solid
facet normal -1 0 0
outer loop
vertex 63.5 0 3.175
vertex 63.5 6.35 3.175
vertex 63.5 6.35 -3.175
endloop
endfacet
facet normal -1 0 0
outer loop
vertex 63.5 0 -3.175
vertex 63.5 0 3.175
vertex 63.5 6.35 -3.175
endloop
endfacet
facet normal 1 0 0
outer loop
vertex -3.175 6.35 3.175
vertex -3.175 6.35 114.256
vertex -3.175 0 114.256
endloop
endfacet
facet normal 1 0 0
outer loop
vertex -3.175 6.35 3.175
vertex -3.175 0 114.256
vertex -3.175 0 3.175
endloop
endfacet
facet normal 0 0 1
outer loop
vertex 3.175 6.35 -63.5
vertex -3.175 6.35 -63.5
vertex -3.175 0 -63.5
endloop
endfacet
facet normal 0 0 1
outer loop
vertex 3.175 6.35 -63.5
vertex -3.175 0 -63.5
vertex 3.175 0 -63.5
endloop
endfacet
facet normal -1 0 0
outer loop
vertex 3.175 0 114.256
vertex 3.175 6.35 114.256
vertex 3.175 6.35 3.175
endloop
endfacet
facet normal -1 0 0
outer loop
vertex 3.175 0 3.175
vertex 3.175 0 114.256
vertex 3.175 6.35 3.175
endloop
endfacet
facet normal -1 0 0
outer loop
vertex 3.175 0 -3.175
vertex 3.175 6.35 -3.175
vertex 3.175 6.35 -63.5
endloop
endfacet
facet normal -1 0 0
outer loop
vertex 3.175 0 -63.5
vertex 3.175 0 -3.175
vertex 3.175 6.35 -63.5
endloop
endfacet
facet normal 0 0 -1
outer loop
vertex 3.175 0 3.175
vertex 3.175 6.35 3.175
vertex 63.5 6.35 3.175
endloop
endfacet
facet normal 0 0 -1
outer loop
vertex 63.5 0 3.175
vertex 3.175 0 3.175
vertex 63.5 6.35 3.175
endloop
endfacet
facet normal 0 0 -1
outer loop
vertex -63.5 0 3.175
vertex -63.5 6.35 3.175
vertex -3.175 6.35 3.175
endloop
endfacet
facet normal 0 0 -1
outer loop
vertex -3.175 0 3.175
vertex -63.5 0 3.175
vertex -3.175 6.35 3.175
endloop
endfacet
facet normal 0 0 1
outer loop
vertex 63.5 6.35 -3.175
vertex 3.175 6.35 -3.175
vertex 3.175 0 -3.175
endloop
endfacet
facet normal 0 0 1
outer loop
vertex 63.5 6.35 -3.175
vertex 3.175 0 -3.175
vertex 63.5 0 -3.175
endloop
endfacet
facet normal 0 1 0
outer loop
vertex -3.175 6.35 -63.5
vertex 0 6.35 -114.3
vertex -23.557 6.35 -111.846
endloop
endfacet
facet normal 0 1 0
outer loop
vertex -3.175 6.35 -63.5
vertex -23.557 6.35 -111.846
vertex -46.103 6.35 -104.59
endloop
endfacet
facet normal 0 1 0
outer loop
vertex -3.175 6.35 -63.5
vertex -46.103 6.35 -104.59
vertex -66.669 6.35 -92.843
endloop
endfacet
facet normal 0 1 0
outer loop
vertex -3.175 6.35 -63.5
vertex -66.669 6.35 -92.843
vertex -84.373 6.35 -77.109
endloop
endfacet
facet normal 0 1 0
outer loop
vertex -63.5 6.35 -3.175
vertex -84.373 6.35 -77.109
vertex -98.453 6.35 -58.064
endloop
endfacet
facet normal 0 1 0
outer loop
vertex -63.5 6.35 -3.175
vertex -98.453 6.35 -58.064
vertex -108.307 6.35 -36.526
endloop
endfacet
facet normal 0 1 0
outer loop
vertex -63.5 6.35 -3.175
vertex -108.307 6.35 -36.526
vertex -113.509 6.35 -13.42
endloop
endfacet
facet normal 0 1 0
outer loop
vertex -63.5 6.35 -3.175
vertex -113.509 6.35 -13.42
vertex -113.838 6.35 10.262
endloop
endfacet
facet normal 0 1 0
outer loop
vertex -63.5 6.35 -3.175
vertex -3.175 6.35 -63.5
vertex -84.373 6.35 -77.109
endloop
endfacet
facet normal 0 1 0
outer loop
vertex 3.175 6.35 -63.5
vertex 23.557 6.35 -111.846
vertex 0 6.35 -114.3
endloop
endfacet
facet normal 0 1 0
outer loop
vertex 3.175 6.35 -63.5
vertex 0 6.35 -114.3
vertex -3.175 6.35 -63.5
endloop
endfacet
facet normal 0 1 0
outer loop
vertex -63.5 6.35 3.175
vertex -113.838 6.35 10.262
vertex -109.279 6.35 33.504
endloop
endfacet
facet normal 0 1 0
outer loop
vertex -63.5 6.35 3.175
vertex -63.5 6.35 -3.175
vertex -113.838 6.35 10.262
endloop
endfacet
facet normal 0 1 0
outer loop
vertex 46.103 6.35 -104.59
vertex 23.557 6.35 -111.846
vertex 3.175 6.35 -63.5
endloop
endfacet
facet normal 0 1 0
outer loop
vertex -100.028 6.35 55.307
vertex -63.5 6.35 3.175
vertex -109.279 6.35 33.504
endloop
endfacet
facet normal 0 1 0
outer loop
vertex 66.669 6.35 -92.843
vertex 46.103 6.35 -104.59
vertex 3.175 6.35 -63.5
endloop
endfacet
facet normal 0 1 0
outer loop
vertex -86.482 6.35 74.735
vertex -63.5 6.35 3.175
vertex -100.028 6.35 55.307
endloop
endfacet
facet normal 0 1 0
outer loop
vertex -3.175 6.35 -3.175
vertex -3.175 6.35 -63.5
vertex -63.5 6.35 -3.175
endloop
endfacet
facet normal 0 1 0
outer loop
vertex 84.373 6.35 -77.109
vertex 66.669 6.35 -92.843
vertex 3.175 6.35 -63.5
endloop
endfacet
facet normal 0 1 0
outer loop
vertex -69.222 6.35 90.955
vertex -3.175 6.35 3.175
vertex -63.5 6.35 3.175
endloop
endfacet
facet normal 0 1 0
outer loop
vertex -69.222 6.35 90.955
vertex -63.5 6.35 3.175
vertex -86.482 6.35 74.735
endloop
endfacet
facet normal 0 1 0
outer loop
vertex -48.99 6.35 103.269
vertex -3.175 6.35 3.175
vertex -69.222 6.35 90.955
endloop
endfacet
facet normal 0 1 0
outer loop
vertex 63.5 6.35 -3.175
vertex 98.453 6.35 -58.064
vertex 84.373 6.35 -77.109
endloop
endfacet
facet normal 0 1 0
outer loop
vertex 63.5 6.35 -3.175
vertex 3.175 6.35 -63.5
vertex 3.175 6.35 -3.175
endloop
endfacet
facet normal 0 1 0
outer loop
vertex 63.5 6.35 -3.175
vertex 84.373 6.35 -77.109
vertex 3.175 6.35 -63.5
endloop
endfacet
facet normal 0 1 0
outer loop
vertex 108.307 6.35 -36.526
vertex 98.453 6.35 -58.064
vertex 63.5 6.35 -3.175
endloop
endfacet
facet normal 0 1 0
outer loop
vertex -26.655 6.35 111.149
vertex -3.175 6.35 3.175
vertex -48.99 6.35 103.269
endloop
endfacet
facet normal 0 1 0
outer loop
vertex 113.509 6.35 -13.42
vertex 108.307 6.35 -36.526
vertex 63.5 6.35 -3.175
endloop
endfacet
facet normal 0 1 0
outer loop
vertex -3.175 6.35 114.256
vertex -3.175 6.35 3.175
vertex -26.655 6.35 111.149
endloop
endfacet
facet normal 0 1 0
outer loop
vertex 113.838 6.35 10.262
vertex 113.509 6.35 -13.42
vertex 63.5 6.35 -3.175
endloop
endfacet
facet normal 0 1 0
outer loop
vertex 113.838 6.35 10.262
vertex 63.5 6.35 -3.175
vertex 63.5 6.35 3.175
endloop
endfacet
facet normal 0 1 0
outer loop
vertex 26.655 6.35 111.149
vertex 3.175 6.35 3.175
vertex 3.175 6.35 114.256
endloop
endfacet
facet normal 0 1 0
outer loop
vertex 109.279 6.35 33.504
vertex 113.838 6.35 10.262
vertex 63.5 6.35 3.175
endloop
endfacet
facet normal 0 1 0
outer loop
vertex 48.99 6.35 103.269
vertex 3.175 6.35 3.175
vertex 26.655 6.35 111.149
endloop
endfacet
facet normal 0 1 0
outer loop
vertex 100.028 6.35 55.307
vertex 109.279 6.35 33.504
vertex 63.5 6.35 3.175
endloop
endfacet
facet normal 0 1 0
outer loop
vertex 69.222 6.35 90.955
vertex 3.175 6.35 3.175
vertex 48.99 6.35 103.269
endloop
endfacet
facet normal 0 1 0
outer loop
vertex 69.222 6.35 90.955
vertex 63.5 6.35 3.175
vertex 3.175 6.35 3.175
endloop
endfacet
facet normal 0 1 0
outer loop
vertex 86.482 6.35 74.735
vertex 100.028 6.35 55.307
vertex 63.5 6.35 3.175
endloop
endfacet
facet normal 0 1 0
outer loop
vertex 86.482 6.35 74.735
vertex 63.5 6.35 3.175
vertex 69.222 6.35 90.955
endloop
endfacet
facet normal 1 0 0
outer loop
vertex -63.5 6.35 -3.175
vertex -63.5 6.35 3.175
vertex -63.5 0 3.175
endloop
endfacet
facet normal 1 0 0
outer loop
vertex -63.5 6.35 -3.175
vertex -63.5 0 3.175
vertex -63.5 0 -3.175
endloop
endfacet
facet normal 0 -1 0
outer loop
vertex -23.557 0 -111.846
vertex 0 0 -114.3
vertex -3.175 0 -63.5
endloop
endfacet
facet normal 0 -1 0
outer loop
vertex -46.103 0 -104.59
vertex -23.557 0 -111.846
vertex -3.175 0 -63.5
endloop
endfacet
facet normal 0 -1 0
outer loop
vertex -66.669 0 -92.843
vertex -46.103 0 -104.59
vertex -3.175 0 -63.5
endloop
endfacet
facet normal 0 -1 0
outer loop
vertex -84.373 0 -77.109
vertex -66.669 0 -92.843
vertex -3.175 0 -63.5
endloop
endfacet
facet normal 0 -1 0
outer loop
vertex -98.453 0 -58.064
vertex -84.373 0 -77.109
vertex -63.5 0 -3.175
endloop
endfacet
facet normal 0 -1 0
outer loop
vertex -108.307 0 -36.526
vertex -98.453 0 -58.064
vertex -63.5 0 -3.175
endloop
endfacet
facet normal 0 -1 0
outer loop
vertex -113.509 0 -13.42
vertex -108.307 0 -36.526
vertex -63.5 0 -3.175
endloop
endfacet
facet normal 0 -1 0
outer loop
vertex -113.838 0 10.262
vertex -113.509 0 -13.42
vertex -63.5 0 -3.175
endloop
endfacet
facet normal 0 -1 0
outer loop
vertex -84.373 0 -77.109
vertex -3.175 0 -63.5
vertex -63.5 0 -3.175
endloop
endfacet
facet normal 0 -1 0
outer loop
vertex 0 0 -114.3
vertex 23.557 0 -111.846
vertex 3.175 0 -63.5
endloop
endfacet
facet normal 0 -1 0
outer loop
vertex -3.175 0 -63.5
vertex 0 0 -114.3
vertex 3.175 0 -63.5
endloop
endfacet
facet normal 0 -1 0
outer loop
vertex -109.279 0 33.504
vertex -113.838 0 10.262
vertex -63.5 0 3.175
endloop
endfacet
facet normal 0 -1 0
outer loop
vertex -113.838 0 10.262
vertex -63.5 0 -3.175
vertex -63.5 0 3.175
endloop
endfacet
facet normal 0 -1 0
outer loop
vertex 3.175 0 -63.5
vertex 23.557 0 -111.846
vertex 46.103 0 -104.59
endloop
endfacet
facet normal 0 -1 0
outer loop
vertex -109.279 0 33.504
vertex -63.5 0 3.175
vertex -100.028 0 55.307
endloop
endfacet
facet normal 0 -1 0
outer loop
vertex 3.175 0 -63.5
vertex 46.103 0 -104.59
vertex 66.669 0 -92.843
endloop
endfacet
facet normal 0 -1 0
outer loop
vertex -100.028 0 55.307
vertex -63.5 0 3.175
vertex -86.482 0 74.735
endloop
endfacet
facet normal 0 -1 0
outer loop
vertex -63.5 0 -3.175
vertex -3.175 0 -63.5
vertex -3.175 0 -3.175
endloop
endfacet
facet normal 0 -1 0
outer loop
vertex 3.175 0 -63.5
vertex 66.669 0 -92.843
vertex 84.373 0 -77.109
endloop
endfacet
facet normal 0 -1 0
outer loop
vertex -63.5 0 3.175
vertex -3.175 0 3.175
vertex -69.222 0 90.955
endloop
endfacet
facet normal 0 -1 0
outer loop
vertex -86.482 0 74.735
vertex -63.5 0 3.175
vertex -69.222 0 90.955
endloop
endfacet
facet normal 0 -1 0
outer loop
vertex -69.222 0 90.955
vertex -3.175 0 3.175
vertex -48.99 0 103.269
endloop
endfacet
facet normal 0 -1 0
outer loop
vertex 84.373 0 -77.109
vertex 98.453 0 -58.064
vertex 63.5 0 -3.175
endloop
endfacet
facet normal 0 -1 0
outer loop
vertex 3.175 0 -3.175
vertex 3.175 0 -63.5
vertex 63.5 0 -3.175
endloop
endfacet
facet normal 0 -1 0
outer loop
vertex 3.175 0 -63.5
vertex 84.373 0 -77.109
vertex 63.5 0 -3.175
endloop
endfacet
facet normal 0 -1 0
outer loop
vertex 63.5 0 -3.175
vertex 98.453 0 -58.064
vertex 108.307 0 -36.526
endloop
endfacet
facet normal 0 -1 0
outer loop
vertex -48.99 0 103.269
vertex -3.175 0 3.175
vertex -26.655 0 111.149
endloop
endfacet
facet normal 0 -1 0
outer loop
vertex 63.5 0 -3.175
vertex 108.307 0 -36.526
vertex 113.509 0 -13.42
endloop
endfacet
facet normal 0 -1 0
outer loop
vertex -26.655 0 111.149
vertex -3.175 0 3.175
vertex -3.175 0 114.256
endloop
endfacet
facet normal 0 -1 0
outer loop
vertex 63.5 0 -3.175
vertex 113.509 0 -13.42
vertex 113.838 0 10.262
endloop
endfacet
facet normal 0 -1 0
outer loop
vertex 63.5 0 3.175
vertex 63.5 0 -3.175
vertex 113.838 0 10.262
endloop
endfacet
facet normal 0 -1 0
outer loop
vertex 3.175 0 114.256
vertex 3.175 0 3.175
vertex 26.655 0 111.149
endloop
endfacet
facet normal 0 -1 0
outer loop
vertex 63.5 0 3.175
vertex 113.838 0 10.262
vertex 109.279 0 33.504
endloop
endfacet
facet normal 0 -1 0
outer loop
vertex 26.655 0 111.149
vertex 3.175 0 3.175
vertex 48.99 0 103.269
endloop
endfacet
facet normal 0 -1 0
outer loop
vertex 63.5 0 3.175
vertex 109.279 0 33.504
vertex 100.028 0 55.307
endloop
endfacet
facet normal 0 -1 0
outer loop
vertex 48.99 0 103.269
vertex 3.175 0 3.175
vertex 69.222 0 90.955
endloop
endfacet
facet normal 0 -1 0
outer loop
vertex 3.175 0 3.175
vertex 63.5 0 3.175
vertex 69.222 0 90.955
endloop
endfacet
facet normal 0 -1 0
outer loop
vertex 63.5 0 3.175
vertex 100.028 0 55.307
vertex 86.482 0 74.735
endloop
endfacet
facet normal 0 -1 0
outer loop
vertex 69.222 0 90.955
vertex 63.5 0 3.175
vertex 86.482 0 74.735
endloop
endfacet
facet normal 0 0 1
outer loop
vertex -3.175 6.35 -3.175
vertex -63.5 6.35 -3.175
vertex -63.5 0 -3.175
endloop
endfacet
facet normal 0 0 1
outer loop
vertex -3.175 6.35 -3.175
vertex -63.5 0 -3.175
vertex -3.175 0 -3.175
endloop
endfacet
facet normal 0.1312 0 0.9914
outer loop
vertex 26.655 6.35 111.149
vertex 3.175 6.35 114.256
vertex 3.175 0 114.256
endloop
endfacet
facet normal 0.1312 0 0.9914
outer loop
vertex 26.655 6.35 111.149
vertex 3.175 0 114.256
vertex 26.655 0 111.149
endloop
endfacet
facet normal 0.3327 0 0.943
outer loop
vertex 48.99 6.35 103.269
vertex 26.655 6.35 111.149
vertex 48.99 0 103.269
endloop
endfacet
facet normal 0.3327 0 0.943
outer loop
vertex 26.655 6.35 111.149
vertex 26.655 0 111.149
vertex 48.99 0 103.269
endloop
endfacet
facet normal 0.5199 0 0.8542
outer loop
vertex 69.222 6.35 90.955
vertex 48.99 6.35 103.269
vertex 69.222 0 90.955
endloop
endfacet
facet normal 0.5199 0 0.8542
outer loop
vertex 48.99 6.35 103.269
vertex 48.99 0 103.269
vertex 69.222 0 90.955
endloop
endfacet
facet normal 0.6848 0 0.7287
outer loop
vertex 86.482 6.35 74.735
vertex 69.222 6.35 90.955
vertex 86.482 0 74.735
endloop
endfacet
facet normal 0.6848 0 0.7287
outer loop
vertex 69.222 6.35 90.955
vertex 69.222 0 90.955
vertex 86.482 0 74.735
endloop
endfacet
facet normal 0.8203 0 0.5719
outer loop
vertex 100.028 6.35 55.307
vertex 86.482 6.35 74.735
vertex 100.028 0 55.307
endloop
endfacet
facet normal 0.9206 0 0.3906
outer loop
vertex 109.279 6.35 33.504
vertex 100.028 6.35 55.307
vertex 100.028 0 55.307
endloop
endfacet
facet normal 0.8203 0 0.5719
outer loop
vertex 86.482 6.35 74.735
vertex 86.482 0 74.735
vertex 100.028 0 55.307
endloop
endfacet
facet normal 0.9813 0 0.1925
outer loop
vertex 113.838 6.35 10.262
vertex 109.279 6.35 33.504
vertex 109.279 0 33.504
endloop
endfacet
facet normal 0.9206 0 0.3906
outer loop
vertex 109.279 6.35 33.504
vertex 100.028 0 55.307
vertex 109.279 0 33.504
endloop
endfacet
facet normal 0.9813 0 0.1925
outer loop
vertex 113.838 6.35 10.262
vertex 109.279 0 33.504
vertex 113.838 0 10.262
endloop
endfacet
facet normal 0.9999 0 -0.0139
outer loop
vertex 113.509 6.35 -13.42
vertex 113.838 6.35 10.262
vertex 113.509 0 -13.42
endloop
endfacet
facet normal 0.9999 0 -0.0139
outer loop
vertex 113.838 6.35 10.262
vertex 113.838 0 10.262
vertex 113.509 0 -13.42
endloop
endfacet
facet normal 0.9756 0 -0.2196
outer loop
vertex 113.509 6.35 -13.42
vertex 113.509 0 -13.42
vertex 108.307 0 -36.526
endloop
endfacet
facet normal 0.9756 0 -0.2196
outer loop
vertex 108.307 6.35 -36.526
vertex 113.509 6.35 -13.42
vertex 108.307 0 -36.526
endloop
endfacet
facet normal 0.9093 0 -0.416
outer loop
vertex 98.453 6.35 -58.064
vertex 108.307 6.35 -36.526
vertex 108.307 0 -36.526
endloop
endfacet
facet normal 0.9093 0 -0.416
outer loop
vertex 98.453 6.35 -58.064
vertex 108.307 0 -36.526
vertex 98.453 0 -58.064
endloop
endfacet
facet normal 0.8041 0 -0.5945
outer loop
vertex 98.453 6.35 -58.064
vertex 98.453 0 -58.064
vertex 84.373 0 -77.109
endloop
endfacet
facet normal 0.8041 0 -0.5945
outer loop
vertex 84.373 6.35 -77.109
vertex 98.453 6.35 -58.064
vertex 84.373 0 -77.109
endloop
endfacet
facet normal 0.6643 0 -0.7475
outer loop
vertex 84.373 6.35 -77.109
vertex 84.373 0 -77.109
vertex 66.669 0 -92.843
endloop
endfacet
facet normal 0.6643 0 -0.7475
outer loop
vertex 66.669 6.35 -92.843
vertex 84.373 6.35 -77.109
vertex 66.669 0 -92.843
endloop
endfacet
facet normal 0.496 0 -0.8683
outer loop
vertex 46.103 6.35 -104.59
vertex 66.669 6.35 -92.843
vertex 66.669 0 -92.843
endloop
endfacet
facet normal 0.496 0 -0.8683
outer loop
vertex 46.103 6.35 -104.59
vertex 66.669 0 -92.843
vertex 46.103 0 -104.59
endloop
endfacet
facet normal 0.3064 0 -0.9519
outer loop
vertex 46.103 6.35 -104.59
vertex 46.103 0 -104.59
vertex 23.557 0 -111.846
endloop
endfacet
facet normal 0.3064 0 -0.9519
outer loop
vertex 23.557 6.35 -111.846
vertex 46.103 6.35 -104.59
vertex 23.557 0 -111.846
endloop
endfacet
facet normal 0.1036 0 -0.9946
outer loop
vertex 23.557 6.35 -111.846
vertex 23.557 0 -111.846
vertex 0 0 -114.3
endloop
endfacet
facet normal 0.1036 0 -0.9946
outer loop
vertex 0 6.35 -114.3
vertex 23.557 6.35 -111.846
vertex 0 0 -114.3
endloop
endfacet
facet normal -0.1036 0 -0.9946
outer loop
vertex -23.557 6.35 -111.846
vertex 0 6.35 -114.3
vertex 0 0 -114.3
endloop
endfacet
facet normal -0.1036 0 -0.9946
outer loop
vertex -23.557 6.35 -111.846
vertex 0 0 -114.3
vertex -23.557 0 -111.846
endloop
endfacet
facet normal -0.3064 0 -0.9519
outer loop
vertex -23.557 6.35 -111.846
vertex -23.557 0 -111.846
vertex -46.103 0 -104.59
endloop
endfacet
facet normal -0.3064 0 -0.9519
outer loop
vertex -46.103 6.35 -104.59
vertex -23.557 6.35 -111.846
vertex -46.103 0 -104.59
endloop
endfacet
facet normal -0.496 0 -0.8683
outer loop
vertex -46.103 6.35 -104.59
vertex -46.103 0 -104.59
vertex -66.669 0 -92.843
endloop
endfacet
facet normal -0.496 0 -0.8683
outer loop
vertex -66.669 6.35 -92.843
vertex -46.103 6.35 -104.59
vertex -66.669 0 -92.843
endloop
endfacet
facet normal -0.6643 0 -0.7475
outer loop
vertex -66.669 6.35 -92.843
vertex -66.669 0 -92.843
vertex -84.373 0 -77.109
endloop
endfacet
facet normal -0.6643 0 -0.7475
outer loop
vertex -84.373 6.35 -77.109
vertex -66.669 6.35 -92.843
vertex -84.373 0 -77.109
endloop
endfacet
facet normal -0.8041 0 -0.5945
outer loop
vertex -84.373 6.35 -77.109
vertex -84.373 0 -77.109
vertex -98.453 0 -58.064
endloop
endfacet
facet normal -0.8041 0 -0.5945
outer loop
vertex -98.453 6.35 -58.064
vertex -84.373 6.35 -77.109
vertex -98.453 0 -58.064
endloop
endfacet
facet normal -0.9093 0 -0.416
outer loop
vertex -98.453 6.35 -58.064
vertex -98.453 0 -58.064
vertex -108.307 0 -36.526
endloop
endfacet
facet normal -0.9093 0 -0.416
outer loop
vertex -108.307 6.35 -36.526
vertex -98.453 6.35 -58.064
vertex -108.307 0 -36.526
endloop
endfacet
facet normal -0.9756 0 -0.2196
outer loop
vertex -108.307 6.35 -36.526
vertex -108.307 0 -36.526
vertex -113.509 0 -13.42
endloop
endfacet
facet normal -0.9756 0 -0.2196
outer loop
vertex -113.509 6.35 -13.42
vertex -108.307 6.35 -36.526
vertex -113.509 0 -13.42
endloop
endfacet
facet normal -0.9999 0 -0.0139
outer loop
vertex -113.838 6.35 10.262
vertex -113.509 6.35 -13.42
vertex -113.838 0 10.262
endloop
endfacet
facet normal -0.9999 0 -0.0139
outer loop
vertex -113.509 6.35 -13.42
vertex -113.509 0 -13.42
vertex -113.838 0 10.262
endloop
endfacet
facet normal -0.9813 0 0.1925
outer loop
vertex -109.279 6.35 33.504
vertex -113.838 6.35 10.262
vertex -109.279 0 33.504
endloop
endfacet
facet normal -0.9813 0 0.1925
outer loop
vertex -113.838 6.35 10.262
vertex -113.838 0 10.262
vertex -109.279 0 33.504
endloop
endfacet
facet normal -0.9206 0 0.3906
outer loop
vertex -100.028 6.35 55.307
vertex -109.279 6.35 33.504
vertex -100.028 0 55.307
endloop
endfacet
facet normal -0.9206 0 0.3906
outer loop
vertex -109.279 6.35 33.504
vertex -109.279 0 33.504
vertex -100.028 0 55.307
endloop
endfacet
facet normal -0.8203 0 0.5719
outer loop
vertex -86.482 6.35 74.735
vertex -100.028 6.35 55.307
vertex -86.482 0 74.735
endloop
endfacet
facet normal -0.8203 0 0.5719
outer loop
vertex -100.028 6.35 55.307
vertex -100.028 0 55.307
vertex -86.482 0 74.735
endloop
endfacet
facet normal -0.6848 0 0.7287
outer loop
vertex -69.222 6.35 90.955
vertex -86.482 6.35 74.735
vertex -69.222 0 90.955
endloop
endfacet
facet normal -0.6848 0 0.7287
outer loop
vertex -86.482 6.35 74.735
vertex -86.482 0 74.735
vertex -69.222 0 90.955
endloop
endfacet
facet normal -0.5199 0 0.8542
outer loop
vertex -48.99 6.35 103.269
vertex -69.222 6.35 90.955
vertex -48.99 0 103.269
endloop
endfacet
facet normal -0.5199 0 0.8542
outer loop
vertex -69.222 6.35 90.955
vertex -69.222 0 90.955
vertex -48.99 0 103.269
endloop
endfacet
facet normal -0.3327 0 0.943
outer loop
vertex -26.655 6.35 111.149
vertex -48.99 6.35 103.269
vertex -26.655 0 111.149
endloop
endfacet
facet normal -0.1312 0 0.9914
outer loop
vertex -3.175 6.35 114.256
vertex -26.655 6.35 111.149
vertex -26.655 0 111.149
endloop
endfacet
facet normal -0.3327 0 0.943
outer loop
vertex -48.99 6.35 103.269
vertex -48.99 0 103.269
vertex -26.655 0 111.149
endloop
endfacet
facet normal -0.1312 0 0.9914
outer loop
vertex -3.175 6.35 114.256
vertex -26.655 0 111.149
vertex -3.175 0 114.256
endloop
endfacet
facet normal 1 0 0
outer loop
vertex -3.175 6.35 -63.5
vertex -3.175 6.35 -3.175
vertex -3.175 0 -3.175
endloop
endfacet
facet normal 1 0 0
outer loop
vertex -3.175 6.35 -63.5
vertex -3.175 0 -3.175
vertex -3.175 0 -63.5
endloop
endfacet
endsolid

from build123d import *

# Parameters (mm, degrees)
SKETCH1_R           = 114.3
BOSS_EXTRUDE1_DEPTH = 6.35
SKETCH2_W           = 6.35
SKETCH2_H           = 114.3
CUT_EXTRUDE1_DEPTH  = 6.35
SKETCH3_W           = 127
SKETCH3_H           = 6.35
CUT_EXTRUDE2_DEPTH  = 162.769287876
SKETCH4_W           = 6.35
SKETCH4_H           = 63.5
CUT_EXTRUDE3_DEPTH  = 162.769287876


with BuildPart() as part:
    # Sketch1 → Boss-Extrude1 (new body)
    with BuildSketch(Plane(origin=(0, 0, 0), x_dir=(1, 0, 0), z_dir=(0, 1, 0))):
        with Locations(Location((0, 0, 0), (0, 0, 270))):
            Circle(SKETCH1_R)
    extrude(amount=BOSS_EXTRUDE1_DEPTH)

    # Sketch2 → Cut-Extrude1 (cut)
    with BuildSketch(Plane(origin=(0, 6.35, 0), x_dir=(1, 0, 0), z_dir=(0, 1, 0))):
        with Locations((0, -57.15)):
            Rectangle(SKETCH2_W, SKETCH2_H)
    extrude(amount=-CUT_EXTRUDE1_DEPTH, mode=Mode.SUBTRACT)

    # Sketch3 → Cut-Extrude2 (cut, through all)
    with BuildSketch(Plane(origin=(0, 6.35, 0), x_dir=(1, 0, 0), z_dir=(0, 1, 0))):
        Rectangle(SKETCH3_W, SKETCH3_H)
    extrude(amount=-CUT_EXTRUDE2_DEPTH, mode=Mode.SUBTRACT)

    # Sketch4 → Cut-Extrude3 (cut, through all)
    with BuildSketch(Plane(origin=(0, 6.35, 0), x_dir=(1, 0, 0), z_dir=(0, 1, 0))):
        with Locations((0, 31.75)):
            Rectangle(SKETCH4_W, SKETCH4_H)
    extrude(amount=-CUT_EXTRUDE3_DEPTH, mode=Mode.SUBTRACT)


solid = part.part
